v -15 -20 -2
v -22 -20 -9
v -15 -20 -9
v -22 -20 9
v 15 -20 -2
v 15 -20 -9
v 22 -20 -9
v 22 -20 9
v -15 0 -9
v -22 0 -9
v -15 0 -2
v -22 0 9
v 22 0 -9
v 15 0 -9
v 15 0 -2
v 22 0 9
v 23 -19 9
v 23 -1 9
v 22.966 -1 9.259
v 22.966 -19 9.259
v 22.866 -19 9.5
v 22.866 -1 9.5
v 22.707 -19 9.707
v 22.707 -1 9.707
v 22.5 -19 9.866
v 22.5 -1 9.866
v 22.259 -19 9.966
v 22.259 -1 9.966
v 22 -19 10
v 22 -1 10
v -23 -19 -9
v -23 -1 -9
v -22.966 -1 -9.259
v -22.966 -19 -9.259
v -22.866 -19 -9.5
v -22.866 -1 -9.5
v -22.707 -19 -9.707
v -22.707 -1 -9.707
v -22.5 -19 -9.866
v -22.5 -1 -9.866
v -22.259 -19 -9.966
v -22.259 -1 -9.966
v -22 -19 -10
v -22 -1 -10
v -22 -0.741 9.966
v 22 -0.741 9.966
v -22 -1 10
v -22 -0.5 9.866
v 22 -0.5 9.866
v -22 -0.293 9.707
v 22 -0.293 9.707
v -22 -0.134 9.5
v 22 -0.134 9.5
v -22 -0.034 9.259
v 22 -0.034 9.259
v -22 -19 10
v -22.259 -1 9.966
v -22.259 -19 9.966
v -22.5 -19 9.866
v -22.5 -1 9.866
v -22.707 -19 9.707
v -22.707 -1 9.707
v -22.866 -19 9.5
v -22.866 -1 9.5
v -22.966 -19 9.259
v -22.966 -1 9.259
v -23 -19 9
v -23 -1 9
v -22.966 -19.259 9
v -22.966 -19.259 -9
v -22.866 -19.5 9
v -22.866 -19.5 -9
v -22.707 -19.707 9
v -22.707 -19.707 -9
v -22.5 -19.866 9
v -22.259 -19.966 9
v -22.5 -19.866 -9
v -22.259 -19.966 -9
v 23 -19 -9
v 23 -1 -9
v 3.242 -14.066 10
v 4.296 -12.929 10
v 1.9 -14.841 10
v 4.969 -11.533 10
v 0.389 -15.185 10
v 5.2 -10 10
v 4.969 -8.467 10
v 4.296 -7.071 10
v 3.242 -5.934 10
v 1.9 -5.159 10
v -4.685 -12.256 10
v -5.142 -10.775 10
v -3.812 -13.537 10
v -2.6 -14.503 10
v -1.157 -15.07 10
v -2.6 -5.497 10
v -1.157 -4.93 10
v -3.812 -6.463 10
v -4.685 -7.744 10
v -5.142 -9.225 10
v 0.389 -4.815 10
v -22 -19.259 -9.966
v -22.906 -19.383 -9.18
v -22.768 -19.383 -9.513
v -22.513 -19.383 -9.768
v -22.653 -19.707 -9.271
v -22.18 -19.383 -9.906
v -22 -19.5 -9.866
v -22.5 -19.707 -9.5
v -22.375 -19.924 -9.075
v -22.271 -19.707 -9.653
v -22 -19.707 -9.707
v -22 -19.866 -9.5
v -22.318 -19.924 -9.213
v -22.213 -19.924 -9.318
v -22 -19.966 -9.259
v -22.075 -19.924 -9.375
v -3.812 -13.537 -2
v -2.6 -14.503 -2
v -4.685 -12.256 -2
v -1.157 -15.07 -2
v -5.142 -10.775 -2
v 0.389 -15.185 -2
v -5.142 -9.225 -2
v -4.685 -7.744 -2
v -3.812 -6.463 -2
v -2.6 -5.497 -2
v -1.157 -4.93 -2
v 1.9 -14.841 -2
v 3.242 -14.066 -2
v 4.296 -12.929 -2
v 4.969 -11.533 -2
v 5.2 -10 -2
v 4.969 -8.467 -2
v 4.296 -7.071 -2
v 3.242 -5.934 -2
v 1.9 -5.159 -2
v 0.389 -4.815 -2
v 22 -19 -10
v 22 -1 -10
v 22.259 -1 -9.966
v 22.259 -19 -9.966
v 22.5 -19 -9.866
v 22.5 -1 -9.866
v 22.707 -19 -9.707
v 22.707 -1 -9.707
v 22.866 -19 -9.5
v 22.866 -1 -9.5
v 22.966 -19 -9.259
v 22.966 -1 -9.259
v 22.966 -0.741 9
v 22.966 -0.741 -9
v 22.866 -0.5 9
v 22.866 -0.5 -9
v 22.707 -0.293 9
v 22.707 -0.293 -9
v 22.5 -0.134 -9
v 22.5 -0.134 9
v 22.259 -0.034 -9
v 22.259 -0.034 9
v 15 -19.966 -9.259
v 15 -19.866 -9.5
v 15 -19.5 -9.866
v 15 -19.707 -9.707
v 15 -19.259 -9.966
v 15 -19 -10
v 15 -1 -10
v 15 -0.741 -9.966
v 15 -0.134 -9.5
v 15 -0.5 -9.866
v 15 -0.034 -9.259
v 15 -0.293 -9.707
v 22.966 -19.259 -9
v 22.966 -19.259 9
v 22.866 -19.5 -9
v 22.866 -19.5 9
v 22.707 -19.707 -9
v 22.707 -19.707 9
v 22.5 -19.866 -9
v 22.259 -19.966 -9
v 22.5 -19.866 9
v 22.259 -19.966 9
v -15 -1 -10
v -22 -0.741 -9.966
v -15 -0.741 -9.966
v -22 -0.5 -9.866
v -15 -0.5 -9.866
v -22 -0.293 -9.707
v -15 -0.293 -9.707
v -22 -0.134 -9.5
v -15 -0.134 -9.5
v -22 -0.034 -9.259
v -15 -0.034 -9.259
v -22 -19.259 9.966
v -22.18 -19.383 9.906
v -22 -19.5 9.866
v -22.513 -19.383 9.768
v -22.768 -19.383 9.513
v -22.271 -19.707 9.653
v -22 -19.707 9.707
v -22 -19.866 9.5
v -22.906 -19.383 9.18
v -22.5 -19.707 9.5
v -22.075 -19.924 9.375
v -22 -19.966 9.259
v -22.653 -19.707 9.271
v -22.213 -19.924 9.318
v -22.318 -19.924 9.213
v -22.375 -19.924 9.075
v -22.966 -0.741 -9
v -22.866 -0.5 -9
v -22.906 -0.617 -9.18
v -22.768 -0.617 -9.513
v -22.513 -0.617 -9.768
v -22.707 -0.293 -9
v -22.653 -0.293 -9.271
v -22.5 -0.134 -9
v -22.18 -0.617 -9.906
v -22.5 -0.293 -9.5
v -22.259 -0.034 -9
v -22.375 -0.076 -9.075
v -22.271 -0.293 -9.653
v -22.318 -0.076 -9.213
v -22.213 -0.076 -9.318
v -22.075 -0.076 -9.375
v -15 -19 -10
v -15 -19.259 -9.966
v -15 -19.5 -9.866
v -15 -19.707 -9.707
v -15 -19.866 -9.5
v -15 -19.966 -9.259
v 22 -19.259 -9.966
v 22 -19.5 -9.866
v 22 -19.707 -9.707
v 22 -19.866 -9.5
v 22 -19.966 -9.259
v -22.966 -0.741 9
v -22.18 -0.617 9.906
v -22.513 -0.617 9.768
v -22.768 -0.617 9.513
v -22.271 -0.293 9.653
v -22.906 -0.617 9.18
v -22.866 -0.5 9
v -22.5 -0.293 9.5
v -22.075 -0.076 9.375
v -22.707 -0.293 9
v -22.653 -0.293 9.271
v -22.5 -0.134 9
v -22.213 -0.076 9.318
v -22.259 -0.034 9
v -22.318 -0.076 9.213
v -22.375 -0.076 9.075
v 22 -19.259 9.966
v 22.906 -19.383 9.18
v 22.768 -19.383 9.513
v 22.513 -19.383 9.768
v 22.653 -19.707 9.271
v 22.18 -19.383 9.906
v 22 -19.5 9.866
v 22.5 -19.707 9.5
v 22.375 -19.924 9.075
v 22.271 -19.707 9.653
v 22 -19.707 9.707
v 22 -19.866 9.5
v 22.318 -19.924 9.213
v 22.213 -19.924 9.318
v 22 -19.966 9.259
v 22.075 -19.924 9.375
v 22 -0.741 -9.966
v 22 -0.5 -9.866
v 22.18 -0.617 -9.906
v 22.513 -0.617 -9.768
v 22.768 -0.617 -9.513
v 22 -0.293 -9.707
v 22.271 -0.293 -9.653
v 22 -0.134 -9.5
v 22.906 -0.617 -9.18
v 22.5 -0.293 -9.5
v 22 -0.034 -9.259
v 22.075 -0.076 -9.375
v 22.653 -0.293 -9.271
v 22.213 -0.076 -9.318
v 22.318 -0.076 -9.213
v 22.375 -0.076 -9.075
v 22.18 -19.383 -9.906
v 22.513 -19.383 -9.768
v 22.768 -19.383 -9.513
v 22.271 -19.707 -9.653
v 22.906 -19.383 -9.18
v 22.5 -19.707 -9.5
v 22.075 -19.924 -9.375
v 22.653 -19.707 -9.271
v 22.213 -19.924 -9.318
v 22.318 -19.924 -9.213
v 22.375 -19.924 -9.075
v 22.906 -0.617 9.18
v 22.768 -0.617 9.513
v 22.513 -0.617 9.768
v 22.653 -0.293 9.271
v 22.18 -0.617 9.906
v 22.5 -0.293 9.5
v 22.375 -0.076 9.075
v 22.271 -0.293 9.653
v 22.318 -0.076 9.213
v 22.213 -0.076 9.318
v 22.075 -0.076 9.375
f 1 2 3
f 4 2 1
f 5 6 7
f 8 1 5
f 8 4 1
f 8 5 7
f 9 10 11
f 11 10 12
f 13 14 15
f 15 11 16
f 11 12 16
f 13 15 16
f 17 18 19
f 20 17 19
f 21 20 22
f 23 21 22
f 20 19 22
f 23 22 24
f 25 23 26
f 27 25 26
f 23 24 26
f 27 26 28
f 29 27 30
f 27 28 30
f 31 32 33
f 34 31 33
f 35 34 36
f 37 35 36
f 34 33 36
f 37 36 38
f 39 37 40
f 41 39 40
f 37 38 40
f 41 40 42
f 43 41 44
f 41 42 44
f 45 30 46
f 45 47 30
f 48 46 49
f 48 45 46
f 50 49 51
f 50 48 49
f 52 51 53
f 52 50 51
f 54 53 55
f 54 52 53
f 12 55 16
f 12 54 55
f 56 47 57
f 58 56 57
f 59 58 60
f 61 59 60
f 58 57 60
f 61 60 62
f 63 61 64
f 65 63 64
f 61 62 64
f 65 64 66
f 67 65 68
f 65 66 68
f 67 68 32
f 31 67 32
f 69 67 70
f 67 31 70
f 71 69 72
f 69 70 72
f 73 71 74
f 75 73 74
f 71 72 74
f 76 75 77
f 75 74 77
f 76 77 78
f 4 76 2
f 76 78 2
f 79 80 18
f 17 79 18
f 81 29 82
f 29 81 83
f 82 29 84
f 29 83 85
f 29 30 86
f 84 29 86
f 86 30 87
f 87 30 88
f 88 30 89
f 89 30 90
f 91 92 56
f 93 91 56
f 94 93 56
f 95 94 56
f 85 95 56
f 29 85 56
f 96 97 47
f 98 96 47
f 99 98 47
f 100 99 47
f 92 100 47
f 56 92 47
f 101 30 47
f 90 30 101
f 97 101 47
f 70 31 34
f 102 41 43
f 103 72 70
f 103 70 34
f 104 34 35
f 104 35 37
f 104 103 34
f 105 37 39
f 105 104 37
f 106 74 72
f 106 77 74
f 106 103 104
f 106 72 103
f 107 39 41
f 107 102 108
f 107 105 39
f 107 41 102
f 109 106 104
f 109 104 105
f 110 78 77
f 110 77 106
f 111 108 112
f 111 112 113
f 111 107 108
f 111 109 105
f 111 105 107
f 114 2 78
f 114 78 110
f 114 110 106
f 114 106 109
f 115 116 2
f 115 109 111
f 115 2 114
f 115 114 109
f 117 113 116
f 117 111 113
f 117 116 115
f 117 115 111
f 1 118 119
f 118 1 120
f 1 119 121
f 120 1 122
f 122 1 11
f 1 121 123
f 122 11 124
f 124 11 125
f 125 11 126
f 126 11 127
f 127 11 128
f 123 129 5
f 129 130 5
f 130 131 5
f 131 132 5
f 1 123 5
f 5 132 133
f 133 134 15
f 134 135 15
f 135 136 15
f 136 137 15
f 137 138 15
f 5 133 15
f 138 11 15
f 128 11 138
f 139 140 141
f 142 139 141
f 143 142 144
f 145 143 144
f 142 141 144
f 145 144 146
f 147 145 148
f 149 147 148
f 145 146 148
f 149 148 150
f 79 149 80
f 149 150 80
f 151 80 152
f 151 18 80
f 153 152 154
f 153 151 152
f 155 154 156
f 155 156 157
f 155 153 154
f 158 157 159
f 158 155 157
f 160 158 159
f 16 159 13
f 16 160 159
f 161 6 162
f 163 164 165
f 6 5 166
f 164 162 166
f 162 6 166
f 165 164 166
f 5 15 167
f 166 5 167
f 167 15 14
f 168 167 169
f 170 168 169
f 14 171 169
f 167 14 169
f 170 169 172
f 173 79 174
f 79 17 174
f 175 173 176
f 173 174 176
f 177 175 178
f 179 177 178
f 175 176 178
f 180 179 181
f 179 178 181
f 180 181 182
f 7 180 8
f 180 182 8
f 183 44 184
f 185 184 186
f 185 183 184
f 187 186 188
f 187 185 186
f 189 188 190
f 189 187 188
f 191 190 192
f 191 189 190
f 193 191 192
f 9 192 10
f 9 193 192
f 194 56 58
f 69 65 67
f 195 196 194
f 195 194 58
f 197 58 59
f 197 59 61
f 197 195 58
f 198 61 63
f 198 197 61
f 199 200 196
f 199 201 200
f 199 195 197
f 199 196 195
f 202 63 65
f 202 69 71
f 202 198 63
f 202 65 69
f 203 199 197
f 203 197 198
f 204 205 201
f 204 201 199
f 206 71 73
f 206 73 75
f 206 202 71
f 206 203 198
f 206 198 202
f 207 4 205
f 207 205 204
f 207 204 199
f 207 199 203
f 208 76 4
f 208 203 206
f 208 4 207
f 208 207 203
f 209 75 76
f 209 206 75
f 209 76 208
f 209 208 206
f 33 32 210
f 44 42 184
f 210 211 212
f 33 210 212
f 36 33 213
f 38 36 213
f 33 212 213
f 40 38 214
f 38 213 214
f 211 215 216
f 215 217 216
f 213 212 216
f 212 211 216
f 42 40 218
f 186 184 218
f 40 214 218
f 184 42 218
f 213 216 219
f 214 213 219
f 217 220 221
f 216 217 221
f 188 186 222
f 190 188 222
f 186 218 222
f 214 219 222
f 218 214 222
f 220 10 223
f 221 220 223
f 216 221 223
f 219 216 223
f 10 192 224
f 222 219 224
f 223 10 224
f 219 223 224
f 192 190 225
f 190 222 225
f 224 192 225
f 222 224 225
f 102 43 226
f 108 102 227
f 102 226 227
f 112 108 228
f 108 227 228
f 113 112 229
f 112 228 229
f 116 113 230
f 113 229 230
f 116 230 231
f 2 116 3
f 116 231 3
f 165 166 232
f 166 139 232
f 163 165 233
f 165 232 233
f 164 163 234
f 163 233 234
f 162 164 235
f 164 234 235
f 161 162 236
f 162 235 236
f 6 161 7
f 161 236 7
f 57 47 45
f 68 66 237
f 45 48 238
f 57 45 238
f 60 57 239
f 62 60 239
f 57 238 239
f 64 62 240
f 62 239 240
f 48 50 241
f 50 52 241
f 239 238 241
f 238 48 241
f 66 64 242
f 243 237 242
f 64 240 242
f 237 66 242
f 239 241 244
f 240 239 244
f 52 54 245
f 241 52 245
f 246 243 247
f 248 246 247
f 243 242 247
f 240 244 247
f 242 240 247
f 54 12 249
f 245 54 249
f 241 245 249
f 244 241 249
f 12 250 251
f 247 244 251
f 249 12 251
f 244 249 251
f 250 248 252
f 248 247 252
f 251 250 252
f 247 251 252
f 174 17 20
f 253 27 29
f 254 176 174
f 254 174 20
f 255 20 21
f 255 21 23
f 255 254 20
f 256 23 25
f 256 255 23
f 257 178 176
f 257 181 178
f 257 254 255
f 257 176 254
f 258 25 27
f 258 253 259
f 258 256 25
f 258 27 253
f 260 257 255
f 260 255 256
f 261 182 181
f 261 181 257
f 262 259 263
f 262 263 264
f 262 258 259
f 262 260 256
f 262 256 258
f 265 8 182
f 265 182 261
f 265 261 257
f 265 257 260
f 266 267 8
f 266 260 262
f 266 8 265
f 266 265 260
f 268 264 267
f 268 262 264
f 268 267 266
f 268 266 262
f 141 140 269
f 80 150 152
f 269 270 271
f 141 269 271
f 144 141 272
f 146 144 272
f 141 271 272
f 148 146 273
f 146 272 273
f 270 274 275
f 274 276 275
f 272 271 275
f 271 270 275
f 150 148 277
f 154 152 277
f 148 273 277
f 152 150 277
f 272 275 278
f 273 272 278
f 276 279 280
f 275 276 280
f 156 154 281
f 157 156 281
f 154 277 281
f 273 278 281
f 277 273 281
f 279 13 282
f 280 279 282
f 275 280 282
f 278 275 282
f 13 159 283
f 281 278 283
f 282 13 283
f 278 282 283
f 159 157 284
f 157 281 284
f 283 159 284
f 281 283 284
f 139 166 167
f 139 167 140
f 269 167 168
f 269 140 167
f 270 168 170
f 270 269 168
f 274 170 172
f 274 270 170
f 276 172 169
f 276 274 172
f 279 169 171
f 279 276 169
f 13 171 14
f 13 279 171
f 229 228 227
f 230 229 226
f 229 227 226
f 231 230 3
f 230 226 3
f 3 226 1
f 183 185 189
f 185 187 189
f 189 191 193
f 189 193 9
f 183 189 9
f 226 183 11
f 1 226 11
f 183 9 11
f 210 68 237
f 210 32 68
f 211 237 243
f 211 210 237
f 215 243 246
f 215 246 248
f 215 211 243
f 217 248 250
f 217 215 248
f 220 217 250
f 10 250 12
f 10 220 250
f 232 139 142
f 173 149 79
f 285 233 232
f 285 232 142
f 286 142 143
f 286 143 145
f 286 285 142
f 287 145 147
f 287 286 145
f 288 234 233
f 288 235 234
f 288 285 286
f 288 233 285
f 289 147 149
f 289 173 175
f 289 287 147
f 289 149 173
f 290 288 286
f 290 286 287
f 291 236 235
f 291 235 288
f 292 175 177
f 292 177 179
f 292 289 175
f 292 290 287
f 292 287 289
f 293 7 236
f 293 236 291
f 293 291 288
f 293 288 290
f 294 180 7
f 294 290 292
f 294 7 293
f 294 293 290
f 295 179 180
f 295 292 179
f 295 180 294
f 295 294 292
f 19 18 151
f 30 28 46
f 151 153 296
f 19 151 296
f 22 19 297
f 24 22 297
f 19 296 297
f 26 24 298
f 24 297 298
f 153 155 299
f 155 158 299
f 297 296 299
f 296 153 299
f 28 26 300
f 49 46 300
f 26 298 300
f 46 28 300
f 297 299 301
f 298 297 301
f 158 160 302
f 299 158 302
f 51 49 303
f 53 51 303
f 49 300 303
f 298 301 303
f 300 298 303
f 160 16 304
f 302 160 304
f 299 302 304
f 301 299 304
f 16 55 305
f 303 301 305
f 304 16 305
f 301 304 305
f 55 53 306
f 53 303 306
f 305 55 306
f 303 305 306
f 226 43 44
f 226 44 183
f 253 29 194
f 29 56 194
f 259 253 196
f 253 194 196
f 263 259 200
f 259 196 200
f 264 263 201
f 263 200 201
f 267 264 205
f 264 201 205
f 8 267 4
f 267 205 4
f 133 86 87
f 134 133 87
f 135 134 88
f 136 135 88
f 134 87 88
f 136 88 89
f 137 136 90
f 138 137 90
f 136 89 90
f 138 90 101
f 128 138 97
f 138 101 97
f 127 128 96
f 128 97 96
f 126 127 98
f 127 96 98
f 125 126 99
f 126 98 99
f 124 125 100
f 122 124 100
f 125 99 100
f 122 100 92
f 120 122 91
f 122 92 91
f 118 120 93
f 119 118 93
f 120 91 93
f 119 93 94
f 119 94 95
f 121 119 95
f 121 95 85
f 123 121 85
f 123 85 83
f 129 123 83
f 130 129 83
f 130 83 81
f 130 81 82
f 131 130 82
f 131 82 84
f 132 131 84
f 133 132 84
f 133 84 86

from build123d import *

# Parameters (mm, degrees)
F1_DEPTH = 20
F2_R     = 5.2
F3_DEPTH = 25
F4_R     = 1


with BuildPart() as f1:
    # F0 (on Front) → F1 (new body)
    with BuildSketch(Plane.XZ):
        with BuildLine():
            Line((22, 10), (-22, 10))
            ThreePointArc((-22, 10), (-22.7071067812, 9.7071067812), (-23, 9))
            Line((-23, 9), (-23, -9))
            ThreePointArc((-23, -9), (-22.7071067812, -9.7071067812), (-22, -10))
            Line((-22, -10), (-15, -10))
            Line((-15, -10), (-15, -2))
            Line((-15, -2), (15, -2))
            Line((15, -2), (15, -10))
            Line((15, -10), (22, -10))
            ThreePointArc((22, -10), (22.7071067812, -9.7071067812), (23, -9))
            Line((23, -9), (23, 9))
            ThreePointArc((23, 9), (22.7071067812, 9.7071067812), (22, 10))
        make_face()
    extrude(amount=F1_DEPTH)

    # F2 (on face) → F3 (cut)
    with BuildSketch(Plane.XY.offset(10)):
        with Locations((0, -10)):
            Circle(F2_R)
    extrude(amount=-F3_DEPTH, mode=Mode.SUBTRACT)

    # F4
    f4_edges = [f1.edges().sort_by_distance(p)[0] for p in [
        (0, -20, 10),
        (23, -20, 0),
        (0, 0, 10),
        (23, 0, 0),
    ]]
    fillet(f4_edges, radius=F4_R)


solid = f1.part
